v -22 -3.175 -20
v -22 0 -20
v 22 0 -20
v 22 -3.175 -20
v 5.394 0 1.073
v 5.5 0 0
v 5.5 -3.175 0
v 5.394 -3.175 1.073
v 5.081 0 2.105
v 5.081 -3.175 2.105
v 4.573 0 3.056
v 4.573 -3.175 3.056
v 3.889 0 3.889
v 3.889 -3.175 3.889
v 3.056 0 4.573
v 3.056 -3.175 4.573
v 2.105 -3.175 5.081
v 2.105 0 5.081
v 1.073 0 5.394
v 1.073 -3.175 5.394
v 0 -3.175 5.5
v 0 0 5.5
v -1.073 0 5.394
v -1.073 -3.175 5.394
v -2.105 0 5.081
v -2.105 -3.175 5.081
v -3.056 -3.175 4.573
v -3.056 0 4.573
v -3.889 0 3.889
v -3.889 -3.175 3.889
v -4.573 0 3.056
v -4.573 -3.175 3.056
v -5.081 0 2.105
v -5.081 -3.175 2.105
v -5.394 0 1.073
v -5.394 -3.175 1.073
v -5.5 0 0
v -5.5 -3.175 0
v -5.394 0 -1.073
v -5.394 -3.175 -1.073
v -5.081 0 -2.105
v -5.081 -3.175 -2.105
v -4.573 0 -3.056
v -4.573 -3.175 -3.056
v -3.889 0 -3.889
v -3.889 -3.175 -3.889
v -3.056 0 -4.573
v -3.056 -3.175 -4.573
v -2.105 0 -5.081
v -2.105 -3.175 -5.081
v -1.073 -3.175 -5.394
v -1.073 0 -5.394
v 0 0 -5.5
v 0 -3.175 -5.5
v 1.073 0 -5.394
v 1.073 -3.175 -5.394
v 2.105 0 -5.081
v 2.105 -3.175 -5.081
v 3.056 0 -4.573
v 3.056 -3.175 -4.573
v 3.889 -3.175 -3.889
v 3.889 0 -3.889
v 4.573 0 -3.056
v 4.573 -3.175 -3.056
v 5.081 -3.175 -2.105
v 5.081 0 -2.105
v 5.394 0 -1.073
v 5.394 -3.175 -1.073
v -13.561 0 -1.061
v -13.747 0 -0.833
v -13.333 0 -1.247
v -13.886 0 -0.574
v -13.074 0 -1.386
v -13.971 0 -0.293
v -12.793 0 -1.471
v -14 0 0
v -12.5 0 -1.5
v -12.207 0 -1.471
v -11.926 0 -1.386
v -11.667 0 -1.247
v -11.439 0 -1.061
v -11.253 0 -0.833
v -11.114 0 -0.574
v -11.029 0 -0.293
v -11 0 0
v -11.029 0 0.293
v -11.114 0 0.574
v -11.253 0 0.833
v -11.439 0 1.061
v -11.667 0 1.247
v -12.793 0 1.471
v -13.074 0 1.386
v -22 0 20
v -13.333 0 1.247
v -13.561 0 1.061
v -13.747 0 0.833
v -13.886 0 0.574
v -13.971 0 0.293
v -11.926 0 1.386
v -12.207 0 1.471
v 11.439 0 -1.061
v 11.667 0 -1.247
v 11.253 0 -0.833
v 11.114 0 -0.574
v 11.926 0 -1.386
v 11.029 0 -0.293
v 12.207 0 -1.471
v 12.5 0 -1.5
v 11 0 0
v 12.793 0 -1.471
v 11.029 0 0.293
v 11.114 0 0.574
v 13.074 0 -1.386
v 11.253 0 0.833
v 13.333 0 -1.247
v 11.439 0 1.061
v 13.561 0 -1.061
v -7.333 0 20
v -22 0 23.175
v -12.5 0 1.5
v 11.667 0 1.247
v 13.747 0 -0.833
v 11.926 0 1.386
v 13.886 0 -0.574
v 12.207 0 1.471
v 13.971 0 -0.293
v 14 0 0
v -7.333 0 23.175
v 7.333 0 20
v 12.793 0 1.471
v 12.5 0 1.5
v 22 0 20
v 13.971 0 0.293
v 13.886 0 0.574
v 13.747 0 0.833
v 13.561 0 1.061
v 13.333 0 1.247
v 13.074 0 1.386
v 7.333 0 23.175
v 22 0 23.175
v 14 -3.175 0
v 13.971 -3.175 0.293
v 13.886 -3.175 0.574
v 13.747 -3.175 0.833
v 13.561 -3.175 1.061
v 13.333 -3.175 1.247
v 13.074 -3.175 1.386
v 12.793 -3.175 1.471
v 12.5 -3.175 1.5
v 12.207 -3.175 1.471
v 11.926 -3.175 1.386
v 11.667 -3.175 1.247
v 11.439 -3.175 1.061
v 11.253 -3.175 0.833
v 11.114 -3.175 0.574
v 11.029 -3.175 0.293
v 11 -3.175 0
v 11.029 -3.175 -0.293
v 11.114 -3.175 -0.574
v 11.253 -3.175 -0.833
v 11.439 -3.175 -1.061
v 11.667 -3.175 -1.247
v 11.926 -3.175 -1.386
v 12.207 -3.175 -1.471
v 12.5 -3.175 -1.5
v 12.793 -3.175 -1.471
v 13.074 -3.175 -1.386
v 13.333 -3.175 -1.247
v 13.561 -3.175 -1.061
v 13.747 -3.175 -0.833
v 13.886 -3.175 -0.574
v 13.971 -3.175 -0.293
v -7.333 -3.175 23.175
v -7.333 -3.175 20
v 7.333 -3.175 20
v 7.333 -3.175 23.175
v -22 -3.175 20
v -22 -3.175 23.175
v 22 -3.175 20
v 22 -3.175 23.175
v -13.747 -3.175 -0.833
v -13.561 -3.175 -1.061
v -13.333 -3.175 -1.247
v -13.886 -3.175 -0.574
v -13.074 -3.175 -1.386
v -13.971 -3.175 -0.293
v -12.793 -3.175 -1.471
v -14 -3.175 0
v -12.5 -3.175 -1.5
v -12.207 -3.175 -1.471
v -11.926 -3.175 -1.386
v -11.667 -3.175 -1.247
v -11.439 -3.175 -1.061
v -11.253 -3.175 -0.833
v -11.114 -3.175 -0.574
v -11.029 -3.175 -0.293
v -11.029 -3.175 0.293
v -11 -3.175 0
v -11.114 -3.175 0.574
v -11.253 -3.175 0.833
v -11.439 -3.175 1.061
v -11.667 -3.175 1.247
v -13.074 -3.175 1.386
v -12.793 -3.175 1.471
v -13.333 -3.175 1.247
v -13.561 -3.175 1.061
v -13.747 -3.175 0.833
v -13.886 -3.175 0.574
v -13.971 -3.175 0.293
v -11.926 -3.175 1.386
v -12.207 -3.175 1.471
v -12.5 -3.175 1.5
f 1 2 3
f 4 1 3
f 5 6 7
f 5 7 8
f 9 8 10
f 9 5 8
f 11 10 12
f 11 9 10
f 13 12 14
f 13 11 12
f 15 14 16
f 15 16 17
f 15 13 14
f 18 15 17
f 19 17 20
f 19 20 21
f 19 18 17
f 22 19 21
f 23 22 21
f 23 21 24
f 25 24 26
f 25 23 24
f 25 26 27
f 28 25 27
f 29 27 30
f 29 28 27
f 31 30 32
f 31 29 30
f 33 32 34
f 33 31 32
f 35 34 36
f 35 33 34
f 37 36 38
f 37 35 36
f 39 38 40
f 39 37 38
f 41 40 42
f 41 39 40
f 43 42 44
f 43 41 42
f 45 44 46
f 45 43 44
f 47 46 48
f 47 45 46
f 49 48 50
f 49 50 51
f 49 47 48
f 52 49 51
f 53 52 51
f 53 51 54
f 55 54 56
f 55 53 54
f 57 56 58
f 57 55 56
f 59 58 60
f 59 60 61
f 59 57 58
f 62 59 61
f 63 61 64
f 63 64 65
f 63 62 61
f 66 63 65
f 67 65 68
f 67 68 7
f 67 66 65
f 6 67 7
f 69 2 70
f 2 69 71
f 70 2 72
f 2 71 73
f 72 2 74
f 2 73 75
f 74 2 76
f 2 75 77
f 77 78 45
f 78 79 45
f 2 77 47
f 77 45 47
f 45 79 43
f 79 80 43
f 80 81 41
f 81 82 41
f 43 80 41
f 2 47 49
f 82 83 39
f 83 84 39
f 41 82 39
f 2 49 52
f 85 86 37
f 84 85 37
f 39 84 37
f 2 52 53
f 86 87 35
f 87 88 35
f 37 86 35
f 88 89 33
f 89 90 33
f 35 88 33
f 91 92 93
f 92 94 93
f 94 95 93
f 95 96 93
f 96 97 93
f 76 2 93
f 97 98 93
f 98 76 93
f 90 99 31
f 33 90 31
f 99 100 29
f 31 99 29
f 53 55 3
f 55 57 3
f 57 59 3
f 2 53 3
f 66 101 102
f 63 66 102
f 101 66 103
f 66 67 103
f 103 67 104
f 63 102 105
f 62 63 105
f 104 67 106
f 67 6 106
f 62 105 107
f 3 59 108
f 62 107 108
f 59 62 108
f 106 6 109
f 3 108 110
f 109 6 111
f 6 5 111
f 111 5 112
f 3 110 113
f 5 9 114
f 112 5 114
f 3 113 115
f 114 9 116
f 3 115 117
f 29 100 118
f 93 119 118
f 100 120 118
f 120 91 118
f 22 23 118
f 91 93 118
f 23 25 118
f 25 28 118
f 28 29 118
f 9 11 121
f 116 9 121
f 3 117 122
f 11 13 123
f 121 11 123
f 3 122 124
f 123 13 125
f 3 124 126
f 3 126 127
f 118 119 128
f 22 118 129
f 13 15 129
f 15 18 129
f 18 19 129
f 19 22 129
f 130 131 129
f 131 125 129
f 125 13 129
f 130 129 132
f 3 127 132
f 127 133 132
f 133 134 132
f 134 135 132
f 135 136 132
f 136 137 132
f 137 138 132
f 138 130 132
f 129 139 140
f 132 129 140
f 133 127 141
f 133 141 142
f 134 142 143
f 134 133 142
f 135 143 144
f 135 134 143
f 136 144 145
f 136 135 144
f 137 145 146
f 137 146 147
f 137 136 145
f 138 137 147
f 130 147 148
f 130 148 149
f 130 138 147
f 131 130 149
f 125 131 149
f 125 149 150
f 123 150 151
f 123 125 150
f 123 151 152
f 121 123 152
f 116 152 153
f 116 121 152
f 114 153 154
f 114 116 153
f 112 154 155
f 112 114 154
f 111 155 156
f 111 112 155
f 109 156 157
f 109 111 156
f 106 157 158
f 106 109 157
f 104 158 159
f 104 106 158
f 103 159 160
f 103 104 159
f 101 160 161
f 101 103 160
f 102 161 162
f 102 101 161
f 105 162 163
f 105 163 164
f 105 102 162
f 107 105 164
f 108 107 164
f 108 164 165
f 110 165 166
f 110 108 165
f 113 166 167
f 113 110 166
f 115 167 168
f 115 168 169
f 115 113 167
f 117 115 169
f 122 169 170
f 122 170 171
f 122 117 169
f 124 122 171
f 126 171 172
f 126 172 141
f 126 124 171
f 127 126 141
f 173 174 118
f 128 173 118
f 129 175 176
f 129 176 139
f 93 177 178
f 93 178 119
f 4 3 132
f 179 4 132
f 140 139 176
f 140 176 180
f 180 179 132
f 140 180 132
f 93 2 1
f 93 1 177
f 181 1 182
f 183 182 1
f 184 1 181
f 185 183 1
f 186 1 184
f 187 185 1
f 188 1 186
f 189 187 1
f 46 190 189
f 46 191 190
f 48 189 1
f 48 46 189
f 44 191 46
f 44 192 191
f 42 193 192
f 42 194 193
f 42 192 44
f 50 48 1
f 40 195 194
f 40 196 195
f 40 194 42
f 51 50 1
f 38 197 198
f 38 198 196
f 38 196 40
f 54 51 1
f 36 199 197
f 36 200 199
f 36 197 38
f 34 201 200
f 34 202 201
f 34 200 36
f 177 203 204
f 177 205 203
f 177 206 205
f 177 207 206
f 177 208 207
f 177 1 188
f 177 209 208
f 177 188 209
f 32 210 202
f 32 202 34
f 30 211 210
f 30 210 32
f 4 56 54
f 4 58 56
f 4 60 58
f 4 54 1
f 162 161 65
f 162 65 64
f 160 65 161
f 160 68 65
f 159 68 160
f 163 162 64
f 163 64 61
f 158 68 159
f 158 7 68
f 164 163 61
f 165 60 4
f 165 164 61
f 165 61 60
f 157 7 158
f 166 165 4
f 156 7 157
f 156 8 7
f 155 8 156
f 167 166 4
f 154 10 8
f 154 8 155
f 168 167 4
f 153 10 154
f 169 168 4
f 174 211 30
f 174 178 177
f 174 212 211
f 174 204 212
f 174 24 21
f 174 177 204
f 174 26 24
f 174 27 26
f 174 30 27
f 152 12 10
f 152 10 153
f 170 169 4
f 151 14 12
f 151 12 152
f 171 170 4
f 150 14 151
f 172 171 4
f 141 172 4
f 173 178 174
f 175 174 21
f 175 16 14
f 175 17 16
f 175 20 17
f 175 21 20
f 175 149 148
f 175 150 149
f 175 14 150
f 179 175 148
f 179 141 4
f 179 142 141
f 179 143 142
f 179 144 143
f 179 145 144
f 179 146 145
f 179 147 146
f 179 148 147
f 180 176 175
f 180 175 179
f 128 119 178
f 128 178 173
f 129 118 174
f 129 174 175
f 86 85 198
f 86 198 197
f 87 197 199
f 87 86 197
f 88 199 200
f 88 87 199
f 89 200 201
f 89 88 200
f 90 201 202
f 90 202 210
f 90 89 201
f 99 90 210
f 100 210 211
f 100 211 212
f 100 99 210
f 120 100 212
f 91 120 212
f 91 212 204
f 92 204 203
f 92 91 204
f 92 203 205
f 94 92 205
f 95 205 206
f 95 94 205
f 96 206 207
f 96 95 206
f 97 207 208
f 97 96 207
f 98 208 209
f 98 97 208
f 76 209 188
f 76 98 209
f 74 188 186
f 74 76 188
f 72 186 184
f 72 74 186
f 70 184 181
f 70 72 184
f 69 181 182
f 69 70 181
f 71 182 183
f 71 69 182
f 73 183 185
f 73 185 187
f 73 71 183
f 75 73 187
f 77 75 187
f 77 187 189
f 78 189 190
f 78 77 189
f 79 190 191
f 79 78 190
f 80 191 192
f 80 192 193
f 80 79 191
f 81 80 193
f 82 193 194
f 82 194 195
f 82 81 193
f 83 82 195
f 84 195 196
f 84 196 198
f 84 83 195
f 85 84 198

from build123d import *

# Parameters (mm, degrees)
F0_W     = 44
F0_H     = 40
F0_R     = 1.5
F0_R_2   = 5.5
F1_DEPTH = 3.175
F2_W     = 14.666667
F2_H     = 3.175
F3_DEPTH = 3.175


with BuildPart() as f1:
    # F0 (on Front) → F1 (new body)
    with BuildSketch(Plane.XZ):
        Rectangle(F0_W, F0_H)
        with Locations((-12.5, 0)):
            Circle(F0_R, mode=Mode.SUBTRACT)
        Circle(F0_R_2, mode=Mode.SUBTRACT)
        with Locations((12.5, 0)):
            Circle(F0_R, mode=Mode.SUBTRACT)
    extrude(amount=F1_DEPTH)

    # F2 (on face) → F3 (join)
    with BuildSketch(Plane.XY.offset(20)):
        with Locations((-14.666666, -1.5875)):
            Rectangle(F2_W, F2_H)
        with Locations((14.666666, -1.5875)):
            Rectangle(F2_W, F2_H)
    extrude(amount=F3_DEPTH)


solid = f1.part
